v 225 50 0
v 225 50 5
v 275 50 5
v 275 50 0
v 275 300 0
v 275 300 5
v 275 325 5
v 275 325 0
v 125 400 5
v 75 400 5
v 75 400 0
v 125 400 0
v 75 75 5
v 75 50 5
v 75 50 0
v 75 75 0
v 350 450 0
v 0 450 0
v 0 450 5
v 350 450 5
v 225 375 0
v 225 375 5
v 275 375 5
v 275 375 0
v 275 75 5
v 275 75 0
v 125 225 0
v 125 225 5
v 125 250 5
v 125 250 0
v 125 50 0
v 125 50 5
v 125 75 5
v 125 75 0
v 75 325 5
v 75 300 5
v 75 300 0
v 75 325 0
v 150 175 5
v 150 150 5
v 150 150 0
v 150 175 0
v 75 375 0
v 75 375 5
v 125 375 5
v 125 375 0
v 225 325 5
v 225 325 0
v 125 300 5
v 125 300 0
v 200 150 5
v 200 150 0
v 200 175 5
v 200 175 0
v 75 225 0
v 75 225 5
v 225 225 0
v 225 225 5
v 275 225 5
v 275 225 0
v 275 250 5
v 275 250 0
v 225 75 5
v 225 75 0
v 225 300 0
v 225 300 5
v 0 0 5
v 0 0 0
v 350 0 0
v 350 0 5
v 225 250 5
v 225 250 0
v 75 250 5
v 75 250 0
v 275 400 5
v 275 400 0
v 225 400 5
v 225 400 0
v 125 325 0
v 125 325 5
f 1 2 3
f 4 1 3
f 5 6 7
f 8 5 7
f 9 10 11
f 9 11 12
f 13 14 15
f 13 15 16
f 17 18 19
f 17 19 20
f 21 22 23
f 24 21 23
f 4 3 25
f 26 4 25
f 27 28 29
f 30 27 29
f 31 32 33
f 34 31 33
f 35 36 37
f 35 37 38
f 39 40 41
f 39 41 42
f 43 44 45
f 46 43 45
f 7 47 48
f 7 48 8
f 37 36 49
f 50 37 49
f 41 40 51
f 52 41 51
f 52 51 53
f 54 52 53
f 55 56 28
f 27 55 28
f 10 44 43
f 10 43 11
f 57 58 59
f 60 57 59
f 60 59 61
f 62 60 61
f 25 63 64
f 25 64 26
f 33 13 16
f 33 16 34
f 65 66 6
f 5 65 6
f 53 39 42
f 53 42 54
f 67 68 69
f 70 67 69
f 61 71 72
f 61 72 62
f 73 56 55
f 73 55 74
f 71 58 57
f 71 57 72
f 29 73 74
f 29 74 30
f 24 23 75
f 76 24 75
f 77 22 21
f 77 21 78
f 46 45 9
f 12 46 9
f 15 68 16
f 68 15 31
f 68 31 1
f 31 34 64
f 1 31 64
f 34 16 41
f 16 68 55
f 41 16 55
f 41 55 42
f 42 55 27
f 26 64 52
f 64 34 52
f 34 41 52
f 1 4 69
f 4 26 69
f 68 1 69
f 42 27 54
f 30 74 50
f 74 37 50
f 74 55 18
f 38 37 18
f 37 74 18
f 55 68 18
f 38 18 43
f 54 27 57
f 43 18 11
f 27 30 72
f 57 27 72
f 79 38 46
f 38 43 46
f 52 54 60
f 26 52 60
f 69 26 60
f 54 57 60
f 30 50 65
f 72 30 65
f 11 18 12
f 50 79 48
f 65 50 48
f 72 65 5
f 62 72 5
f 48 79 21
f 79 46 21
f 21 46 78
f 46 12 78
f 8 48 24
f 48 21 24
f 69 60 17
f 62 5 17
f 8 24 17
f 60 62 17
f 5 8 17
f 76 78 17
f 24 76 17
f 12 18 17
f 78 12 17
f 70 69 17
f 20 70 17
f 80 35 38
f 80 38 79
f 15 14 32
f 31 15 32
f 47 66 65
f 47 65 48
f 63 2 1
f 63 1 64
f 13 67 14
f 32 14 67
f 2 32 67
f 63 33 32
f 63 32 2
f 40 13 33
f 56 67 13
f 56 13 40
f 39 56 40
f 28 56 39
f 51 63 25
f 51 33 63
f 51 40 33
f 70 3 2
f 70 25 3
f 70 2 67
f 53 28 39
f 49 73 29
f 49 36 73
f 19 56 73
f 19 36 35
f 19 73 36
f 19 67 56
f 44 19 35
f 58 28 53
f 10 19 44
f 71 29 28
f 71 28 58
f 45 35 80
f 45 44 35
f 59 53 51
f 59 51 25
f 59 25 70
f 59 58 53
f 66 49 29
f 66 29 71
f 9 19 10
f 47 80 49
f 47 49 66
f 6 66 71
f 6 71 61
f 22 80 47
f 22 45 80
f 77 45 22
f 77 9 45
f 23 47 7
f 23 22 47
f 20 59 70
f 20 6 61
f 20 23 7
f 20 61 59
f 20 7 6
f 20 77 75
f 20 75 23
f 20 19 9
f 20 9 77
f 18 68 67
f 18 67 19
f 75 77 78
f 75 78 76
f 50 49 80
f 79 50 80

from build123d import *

# Parameters (mm, degrees)
SKETCH1_W           = 350
SKETCH1_H           = 450
BOSS_EXTRUDE1_DEPTH = 5
SKETCH2_W           = 50
SKETCH2_H           = 25
CUT_EXTRUDE1_DEPTH  = 571.109638578


with BuildPart() as part:
    # Sketch1 → Boss-Extrude1 (new body)
    with BuildSketch(Plane.XY):
        with Locations((175, 225)):
            Rectangle(SKETCH1_W, SKETCH1_H)
    extrude(amount=BOSS_EXTRUDE1_DEPTH)

    # Sketch2 → Cut-Extrude1 (cut, through all)
    with BuildSketch(Plane.XY.offset(5)):
        with Locations((100, 387.5)):
            Rectangle(SKETCH2_W, SKETCH2_H)
    cut_extrude1 = extrude(amount=-CUT_EXTRUDE1_DEPTH, mode=Mode.SUBTRACT)

    # Sketch-Pattern1: Cut-Extrude1 at 8 more places
    with Locations((150, 0, 0), (150, -75, 0), (0, -75, 0), (0, -150, 0), (150, -150, 0), (75, -225, 0), (0, -325, 0), (150, -325, 0)):
        add(cut_extrude1, mode=Mode.SUBTRACT)


solid = part.part
